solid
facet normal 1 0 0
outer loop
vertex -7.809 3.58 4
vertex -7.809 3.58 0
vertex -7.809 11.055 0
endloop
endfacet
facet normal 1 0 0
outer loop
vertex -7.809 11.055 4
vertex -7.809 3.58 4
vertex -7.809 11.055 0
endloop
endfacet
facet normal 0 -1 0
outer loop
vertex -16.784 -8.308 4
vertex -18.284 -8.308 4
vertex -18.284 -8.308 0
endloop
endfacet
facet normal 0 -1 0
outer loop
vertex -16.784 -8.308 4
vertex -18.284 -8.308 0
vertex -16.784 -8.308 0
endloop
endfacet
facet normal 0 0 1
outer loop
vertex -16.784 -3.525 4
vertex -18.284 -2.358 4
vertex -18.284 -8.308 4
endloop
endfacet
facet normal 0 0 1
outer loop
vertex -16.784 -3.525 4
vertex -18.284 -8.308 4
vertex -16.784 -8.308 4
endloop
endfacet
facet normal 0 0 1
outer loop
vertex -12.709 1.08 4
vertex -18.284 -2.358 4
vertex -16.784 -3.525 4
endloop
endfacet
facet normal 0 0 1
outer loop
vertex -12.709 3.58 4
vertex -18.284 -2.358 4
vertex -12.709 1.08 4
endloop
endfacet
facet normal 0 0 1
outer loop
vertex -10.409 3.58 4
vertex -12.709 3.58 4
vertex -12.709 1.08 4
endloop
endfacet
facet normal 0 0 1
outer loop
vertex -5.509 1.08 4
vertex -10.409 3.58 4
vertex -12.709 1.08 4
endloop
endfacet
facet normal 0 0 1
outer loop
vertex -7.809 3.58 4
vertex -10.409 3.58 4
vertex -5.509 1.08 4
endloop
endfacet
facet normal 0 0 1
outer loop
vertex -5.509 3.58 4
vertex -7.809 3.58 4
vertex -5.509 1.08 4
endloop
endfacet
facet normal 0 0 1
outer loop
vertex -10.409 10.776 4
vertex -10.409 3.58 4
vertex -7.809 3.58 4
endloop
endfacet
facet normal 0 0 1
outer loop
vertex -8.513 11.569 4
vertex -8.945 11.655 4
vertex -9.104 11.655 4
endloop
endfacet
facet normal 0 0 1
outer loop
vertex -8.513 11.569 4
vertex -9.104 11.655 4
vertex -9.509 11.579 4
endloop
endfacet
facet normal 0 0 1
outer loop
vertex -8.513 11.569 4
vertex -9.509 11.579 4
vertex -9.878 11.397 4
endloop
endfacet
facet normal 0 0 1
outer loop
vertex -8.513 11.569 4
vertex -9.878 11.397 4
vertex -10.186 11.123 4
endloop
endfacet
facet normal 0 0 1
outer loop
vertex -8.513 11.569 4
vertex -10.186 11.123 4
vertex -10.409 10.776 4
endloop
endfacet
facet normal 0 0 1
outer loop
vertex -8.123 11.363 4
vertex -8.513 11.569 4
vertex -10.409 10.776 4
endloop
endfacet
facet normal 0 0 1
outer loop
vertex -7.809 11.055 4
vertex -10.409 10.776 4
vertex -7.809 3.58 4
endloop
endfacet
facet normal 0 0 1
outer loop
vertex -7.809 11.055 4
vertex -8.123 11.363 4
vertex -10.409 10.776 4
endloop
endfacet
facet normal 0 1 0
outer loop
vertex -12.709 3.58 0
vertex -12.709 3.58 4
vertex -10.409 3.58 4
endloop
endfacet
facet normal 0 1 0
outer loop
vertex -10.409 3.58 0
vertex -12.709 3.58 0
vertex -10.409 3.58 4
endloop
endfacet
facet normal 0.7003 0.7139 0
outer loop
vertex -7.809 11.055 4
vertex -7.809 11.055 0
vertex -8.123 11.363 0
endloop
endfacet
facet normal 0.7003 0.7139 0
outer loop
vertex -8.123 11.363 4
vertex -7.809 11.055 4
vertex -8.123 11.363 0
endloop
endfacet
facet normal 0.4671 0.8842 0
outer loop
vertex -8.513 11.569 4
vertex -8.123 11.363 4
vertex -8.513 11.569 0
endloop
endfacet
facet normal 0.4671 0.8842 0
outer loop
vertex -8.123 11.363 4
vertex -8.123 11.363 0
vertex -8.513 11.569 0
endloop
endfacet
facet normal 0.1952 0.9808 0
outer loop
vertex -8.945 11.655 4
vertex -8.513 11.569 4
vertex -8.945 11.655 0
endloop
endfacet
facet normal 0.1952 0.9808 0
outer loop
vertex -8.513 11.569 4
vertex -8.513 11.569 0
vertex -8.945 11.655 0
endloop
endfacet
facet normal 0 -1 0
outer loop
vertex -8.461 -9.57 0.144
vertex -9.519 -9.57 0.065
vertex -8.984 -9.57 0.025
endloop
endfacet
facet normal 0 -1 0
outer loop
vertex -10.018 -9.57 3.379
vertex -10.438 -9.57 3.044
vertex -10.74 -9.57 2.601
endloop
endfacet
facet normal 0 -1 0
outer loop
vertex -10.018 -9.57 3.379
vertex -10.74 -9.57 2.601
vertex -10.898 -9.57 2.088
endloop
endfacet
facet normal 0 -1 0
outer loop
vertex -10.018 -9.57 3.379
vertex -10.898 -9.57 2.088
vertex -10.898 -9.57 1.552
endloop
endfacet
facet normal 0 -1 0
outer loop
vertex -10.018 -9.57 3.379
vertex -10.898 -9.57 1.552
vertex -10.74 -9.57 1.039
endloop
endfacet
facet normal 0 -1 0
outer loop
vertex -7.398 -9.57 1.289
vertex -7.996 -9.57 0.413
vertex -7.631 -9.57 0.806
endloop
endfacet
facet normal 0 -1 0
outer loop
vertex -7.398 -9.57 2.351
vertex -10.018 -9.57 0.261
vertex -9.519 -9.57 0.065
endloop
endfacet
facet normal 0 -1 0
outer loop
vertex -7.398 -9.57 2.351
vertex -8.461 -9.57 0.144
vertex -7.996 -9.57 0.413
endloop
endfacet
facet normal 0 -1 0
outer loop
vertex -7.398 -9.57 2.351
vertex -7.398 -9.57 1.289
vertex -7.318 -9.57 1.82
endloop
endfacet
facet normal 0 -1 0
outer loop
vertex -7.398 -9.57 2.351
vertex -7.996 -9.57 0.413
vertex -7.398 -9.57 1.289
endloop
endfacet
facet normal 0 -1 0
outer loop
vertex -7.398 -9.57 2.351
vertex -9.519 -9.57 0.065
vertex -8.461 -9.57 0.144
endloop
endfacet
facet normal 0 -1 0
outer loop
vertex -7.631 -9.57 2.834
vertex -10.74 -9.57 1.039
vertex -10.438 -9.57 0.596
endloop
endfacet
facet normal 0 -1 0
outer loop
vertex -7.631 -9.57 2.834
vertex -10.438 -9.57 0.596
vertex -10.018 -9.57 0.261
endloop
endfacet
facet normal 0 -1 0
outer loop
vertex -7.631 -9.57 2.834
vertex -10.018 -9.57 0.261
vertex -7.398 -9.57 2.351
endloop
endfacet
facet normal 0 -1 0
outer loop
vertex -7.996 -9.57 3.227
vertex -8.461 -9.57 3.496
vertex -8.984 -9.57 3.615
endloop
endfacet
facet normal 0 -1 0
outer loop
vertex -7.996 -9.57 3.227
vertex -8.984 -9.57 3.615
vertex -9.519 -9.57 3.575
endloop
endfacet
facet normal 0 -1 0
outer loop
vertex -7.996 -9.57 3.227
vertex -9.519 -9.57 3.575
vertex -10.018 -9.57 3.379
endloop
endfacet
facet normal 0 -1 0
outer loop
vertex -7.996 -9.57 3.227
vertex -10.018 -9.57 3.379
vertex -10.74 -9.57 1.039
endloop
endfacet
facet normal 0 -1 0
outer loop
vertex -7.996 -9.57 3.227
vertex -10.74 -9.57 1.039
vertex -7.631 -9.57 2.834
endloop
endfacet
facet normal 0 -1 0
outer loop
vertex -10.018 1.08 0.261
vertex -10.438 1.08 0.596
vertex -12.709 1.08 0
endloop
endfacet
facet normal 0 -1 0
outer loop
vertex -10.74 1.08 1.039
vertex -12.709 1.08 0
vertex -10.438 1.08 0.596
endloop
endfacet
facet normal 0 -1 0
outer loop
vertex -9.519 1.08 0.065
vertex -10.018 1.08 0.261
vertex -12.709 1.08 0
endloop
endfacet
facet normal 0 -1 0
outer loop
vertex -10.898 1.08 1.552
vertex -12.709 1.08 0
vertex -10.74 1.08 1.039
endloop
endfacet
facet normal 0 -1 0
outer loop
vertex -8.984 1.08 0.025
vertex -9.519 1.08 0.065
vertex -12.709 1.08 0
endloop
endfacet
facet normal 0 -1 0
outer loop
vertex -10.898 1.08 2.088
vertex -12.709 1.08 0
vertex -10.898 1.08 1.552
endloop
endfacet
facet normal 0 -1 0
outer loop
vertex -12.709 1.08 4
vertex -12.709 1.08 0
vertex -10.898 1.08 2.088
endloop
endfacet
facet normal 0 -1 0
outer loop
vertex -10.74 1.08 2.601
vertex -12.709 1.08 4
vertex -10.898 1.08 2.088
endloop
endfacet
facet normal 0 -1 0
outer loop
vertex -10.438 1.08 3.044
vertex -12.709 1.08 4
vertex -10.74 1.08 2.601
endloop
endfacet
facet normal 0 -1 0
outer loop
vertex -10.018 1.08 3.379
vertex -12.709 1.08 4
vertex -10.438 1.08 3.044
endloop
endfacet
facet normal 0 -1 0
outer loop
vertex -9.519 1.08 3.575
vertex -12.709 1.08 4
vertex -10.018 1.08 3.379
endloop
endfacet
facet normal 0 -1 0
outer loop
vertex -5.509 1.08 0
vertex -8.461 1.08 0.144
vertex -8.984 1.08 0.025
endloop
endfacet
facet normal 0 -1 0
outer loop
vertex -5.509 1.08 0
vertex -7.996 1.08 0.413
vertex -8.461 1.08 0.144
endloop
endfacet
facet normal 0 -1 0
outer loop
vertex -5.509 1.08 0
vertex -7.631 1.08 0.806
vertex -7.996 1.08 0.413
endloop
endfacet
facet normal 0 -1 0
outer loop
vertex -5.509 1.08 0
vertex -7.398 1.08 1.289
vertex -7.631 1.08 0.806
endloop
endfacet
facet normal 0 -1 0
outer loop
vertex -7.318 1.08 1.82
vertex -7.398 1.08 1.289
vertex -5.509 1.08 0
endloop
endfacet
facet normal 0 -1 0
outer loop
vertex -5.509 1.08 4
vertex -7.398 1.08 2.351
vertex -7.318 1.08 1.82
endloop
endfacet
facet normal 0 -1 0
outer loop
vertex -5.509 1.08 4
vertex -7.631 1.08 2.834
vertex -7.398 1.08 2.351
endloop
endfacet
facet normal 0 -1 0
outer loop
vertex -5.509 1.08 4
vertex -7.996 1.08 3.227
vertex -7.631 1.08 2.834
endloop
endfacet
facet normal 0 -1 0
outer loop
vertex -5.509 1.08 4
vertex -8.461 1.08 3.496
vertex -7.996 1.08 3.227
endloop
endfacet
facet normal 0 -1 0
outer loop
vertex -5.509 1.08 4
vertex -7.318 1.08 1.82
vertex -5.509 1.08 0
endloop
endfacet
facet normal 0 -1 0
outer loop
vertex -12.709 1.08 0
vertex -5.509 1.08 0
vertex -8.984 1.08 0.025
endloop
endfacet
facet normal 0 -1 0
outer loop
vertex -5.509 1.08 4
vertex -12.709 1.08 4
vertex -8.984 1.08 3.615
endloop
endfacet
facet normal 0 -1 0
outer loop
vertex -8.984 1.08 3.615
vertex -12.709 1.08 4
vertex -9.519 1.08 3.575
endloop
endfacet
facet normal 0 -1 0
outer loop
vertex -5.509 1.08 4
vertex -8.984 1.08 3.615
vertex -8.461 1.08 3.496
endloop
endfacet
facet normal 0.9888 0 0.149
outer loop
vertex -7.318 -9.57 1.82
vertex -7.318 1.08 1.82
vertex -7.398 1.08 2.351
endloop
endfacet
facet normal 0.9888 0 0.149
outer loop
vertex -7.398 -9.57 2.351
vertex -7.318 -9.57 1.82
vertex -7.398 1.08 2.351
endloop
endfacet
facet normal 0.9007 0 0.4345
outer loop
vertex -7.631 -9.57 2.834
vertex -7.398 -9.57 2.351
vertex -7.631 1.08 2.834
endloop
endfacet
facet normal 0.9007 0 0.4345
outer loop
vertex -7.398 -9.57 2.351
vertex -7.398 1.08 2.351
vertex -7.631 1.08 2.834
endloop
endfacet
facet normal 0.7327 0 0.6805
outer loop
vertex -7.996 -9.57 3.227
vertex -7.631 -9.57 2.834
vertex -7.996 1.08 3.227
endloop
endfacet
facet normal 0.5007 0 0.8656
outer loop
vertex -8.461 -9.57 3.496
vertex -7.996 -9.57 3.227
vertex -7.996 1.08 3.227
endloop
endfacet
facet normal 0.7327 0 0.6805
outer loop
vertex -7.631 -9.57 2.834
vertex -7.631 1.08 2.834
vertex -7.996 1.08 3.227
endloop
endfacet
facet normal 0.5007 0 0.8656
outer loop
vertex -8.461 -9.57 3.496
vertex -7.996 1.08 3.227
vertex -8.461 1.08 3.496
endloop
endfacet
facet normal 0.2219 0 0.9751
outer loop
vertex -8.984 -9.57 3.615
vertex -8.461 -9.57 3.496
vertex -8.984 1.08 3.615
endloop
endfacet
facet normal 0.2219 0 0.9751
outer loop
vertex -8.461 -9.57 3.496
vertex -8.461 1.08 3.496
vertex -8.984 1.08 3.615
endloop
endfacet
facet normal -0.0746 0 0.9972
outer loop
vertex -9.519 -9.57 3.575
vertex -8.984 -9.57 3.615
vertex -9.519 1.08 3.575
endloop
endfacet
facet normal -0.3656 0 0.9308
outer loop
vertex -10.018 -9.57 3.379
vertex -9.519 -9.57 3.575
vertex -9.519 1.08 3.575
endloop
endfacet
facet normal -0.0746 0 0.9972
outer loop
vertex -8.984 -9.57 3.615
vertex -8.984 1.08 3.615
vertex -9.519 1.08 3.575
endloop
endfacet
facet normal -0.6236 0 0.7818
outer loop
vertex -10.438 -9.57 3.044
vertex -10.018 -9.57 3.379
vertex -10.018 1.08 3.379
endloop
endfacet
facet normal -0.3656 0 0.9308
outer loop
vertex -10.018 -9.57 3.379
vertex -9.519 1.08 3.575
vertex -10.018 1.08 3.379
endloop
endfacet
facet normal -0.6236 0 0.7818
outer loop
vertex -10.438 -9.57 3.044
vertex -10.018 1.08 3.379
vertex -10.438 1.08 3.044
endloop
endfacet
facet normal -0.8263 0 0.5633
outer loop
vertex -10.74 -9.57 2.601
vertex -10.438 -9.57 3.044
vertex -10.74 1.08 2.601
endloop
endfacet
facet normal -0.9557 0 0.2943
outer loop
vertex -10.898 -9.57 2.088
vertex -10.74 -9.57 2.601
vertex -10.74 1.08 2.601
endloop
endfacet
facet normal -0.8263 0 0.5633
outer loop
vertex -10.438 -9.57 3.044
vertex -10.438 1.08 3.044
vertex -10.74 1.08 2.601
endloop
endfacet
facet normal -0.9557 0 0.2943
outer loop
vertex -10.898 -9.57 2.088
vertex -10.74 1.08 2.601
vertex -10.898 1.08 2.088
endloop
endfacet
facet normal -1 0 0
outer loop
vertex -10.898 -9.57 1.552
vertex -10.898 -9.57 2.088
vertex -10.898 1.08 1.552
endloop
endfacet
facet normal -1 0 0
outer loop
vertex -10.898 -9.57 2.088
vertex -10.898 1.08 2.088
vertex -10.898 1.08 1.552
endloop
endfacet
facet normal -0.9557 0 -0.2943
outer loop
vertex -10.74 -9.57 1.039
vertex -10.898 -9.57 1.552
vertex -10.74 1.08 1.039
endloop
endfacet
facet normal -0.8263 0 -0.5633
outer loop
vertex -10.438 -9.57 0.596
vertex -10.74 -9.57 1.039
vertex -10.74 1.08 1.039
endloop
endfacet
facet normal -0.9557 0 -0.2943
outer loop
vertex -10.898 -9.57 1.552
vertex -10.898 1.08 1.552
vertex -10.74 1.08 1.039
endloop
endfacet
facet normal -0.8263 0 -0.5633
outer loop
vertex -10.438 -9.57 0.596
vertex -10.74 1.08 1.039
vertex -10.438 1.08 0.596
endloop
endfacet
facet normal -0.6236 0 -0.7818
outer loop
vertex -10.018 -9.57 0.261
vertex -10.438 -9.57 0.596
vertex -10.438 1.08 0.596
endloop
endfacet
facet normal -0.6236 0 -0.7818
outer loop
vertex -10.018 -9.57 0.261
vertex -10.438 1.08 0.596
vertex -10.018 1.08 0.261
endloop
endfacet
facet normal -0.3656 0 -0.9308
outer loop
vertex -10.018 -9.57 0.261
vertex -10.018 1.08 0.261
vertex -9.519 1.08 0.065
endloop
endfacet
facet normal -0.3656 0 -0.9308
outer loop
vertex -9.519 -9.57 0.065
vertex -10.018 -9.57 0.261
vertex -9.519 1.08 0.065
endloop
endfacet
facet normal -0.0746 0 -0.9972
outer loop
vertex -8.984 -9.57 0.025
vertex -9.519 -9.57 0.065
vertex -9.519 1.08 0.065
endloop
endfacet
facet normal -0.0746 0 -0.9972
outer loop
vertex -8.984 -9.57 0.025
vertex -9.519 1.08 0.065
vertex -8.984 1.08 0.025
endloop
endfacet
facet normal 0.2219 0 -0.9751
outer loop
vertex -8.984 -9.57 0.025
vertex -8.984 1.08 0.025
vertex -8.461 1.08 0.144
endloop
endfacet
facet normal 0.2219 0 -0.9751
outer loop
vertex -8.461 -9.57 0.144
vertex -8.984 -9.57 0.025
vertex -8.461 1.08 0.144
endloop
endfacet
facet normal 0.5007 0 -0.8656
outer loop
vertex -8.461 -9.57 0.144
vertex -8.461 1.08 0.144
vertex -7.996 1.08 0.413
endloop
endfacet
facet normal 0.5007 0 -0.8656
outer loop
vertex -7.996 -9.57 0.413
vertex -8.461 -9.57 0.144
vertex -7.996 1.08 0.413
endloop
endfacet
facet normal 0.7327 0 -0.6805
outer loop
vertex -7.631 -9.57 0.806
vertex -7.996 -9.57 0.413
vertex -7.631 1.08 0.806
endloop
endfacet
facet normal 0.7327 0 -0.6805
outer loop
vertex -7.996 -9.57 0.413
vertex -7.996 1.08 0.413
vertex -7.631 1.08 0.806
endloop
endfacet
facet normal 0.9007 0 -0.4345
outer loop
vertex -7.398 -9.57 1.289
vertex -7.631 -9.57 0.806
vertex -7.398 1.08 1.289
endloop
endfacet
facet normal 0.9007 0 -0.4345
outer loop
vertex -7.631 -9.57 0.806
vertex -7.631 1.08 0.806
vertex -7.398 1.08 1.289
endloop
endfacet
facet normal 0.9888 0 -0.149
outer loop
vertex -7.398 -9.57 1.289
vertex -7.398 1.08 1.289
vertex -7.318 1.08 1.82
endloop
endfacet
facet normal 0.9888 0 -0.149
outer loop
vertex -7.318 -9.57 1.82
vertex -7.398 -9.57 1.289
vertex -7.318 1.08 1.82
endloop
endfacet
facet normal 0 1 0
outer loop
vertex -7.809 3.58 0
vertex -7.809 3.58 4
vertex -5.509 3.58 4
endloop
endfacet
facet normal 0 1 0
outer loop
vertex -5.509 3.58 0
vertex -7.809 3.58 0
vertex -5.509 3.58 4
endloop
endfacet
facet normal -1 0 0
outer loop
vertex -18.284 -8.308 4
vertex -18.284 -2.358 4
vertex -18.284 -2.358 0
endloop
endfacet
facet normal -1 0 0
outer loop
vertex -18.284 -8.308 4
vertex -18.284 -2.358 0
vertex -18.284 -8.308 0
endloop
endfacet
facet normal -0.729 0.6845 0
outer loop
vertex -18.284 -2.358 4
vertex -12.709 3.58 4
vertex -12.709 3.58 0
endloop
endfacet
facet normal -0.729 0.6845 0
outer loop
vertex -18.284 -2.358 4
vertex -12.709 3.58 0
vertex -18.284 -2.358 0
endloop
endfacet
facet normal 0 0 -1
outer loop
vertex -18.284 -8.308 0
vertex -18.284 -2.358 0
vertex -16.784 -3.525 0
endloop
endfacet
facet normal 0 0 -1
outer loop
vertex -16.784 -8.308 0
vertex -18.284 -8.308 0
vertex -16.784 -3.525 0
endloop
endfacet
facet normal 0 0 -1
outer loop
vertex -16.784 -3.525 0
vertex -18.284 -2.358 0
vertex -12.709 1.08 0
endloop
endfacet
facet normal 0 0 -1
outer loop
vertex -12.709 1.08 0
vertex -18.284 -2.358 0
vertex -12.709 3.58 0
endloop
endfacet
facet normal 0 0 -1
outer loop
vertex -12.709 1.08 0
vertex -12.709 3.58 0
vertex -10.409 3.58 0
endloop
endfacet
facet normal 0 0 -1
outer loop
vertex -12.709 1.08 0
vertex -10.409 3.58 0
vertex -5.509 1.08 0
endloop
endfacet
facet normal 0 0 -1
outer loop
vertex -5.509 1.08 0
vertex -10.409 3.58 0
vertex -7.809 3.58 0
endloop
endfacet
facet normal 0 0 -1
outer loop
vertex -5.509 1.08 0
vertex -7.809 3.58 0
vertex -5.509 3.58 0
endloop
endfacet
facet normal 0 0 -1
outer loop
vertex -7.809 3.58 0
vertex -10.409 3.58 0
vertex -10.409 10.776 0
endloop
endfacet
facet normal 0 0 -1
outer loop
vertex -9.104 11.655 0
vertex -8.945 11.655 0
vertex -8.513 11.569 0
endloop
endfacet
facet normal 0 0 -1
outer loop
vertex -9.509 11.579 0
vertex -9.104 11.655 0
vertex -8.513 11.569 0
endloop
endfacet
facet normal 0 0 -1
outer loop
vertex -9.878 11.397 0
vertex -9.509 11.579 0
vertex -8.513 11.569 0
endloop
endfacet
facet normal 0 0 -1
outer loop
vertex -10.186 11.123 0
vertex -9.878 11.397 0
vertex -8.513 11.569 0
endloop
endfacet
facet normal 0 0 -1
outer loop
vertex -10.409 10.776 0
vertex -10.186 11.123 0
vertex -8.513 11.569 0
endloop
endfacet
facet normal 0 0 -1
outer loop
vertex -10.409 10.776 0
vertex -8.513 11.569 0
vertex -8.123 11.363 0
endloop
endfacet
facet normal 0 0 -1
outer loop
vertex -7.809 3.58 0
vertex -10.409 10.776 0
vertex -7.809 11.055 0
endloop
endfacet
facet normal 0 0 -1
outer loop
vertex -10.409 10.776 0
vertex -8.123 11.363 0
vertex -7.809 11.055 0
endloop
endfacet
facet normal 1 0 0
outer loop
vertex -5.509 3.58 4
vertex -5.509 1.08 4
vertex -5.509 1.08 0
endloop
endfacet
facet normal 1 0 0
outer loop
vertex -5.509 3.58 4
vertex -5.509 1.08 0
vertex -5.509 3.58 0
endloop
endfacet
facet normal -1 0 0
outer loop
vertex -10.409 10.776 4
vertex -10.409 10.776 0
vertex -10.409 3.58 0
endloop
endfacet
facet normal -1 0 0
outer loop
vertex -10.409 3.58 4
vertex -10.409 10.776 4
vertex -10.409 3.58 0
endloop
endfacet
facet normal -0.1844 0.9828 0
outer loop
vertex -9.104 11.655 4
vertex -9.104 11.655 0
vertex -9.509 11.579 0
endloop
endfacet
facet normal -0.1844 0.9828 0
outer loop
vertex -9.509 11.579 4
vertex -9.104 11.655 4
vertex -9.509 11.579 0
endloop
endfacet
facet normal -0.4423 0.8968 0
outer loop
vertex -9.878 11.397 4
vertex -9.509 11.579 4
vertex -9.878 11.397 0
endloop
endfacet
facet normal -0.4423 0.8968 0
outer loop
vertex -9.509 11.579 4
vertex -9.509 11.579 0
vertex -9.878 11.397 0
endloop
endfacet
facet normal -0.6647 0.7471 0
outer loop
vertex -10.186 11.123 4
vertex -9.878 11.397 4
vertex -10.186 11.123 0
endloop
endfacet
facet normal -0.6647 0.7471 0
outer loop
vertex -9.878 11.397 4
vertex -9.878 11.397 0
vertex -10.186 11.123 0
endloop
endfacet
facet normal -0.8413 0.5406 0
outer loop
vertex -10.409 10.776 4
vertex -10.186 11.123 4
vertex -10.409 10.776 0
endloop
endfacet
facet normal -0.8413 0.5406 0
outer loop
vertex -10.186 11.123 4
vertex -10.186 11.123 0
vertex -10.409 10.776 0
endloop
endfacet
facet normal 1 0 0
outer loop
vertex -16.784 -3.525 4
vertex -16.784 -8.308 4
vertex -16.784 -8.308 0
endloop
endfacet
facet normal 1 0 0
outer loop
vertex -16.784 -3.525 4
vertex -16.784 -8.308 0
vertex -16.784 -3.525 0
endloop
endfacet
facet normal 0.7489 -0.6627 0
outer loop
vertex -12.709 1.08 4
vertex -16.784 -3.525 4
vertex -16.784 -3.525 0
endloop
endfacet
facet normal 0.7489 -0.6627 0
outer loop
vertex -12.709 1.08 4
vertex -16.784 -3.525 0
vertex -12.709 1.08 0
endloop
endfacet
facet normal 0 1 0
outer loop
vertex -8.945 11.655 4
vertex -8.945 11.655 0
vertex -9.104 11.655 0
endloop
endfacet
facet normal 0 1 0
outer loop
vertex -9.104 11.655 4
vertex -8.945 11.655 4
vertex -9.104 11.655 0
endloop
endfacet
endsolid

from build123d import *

# Parameters (mm, degrees)
BOSS_EXTRUDE1_DEPTH = 4
SKETCH_1_W          = 7.2
SKETCH_1_H          = 2.5
EXTRUDE_1_DEPTH     = 4
EXTRUDE_2_DEPTH     = 4
SKETCH_6_R          = 1.8
EXTRUDE_3_DEPTH     = 10.65


with BuildPart() as part:
    # Sketch1 → Boss-Extrude1 (new body)
    with BuildSketch(Plane.XY):
        with BuildLine():
            Line((-10.408670574, 3.576426588), (-7.808670574, 3.576426588))
            Line((-7.808670574, 3.576426588), (-7.808670574, 11.055036677))
            ThreePointArc((-7.808670574, 11.055036677), (-8.310608651, 11.480313821), (-8.944823261, 11.655168937))
            Line((-8.944823261, 11.655168937), (-9.103917888, 11.655168937))
            ThreePointArc((-9.103917888, 11.655168937), (-9.878044557, 11.396572098), (-10.408670574, 10.776426588))
            Line((-10.408670574, 10.776426588), (-10.408670574, 3.576426588))
        make_face()
    extrude(amount=BOSS_EXTRUDE1_DEPTH)

    # Эскиз1 → Бобышка-Вытянуть1 (add)
    with BuildSketch(Plane.XY.offset(4)):
        with Locations((-9.108670574, 2.329960492)):
            Rectangle(SKETCH_1_W, SKETCH_1_H)
    extrude(amount=-EXTRUDE_1_DEPTH)

    # Эскиз5 → Бобышка-Вытянуть2 (add)
    with BuildSketch(Plane.XY.offset(4)):
        Polygon((-12.708670574, 3.579960492), (-18.284126234, -2.357514059), (-18.284126234, -8.307514059), (-16.784126234, -8.307514059), (-16.784126234, -3.524992463), (-12.708670574, 1.079960492), align=None)
    extrude(amount=-EXTRUDE_2_DEPTH)

    # Эскиз6 → Бобышка-Вытянуть3 (add)
    with BuildSketch(Plane.XZ.offset(-1.079960492)):
        with Locations((-9.118354015, 1.82)):
            Circle(SKETCH_6_R)
    extrude(amount=EXTRUDE_3_DEPTH)


solid = part.part
